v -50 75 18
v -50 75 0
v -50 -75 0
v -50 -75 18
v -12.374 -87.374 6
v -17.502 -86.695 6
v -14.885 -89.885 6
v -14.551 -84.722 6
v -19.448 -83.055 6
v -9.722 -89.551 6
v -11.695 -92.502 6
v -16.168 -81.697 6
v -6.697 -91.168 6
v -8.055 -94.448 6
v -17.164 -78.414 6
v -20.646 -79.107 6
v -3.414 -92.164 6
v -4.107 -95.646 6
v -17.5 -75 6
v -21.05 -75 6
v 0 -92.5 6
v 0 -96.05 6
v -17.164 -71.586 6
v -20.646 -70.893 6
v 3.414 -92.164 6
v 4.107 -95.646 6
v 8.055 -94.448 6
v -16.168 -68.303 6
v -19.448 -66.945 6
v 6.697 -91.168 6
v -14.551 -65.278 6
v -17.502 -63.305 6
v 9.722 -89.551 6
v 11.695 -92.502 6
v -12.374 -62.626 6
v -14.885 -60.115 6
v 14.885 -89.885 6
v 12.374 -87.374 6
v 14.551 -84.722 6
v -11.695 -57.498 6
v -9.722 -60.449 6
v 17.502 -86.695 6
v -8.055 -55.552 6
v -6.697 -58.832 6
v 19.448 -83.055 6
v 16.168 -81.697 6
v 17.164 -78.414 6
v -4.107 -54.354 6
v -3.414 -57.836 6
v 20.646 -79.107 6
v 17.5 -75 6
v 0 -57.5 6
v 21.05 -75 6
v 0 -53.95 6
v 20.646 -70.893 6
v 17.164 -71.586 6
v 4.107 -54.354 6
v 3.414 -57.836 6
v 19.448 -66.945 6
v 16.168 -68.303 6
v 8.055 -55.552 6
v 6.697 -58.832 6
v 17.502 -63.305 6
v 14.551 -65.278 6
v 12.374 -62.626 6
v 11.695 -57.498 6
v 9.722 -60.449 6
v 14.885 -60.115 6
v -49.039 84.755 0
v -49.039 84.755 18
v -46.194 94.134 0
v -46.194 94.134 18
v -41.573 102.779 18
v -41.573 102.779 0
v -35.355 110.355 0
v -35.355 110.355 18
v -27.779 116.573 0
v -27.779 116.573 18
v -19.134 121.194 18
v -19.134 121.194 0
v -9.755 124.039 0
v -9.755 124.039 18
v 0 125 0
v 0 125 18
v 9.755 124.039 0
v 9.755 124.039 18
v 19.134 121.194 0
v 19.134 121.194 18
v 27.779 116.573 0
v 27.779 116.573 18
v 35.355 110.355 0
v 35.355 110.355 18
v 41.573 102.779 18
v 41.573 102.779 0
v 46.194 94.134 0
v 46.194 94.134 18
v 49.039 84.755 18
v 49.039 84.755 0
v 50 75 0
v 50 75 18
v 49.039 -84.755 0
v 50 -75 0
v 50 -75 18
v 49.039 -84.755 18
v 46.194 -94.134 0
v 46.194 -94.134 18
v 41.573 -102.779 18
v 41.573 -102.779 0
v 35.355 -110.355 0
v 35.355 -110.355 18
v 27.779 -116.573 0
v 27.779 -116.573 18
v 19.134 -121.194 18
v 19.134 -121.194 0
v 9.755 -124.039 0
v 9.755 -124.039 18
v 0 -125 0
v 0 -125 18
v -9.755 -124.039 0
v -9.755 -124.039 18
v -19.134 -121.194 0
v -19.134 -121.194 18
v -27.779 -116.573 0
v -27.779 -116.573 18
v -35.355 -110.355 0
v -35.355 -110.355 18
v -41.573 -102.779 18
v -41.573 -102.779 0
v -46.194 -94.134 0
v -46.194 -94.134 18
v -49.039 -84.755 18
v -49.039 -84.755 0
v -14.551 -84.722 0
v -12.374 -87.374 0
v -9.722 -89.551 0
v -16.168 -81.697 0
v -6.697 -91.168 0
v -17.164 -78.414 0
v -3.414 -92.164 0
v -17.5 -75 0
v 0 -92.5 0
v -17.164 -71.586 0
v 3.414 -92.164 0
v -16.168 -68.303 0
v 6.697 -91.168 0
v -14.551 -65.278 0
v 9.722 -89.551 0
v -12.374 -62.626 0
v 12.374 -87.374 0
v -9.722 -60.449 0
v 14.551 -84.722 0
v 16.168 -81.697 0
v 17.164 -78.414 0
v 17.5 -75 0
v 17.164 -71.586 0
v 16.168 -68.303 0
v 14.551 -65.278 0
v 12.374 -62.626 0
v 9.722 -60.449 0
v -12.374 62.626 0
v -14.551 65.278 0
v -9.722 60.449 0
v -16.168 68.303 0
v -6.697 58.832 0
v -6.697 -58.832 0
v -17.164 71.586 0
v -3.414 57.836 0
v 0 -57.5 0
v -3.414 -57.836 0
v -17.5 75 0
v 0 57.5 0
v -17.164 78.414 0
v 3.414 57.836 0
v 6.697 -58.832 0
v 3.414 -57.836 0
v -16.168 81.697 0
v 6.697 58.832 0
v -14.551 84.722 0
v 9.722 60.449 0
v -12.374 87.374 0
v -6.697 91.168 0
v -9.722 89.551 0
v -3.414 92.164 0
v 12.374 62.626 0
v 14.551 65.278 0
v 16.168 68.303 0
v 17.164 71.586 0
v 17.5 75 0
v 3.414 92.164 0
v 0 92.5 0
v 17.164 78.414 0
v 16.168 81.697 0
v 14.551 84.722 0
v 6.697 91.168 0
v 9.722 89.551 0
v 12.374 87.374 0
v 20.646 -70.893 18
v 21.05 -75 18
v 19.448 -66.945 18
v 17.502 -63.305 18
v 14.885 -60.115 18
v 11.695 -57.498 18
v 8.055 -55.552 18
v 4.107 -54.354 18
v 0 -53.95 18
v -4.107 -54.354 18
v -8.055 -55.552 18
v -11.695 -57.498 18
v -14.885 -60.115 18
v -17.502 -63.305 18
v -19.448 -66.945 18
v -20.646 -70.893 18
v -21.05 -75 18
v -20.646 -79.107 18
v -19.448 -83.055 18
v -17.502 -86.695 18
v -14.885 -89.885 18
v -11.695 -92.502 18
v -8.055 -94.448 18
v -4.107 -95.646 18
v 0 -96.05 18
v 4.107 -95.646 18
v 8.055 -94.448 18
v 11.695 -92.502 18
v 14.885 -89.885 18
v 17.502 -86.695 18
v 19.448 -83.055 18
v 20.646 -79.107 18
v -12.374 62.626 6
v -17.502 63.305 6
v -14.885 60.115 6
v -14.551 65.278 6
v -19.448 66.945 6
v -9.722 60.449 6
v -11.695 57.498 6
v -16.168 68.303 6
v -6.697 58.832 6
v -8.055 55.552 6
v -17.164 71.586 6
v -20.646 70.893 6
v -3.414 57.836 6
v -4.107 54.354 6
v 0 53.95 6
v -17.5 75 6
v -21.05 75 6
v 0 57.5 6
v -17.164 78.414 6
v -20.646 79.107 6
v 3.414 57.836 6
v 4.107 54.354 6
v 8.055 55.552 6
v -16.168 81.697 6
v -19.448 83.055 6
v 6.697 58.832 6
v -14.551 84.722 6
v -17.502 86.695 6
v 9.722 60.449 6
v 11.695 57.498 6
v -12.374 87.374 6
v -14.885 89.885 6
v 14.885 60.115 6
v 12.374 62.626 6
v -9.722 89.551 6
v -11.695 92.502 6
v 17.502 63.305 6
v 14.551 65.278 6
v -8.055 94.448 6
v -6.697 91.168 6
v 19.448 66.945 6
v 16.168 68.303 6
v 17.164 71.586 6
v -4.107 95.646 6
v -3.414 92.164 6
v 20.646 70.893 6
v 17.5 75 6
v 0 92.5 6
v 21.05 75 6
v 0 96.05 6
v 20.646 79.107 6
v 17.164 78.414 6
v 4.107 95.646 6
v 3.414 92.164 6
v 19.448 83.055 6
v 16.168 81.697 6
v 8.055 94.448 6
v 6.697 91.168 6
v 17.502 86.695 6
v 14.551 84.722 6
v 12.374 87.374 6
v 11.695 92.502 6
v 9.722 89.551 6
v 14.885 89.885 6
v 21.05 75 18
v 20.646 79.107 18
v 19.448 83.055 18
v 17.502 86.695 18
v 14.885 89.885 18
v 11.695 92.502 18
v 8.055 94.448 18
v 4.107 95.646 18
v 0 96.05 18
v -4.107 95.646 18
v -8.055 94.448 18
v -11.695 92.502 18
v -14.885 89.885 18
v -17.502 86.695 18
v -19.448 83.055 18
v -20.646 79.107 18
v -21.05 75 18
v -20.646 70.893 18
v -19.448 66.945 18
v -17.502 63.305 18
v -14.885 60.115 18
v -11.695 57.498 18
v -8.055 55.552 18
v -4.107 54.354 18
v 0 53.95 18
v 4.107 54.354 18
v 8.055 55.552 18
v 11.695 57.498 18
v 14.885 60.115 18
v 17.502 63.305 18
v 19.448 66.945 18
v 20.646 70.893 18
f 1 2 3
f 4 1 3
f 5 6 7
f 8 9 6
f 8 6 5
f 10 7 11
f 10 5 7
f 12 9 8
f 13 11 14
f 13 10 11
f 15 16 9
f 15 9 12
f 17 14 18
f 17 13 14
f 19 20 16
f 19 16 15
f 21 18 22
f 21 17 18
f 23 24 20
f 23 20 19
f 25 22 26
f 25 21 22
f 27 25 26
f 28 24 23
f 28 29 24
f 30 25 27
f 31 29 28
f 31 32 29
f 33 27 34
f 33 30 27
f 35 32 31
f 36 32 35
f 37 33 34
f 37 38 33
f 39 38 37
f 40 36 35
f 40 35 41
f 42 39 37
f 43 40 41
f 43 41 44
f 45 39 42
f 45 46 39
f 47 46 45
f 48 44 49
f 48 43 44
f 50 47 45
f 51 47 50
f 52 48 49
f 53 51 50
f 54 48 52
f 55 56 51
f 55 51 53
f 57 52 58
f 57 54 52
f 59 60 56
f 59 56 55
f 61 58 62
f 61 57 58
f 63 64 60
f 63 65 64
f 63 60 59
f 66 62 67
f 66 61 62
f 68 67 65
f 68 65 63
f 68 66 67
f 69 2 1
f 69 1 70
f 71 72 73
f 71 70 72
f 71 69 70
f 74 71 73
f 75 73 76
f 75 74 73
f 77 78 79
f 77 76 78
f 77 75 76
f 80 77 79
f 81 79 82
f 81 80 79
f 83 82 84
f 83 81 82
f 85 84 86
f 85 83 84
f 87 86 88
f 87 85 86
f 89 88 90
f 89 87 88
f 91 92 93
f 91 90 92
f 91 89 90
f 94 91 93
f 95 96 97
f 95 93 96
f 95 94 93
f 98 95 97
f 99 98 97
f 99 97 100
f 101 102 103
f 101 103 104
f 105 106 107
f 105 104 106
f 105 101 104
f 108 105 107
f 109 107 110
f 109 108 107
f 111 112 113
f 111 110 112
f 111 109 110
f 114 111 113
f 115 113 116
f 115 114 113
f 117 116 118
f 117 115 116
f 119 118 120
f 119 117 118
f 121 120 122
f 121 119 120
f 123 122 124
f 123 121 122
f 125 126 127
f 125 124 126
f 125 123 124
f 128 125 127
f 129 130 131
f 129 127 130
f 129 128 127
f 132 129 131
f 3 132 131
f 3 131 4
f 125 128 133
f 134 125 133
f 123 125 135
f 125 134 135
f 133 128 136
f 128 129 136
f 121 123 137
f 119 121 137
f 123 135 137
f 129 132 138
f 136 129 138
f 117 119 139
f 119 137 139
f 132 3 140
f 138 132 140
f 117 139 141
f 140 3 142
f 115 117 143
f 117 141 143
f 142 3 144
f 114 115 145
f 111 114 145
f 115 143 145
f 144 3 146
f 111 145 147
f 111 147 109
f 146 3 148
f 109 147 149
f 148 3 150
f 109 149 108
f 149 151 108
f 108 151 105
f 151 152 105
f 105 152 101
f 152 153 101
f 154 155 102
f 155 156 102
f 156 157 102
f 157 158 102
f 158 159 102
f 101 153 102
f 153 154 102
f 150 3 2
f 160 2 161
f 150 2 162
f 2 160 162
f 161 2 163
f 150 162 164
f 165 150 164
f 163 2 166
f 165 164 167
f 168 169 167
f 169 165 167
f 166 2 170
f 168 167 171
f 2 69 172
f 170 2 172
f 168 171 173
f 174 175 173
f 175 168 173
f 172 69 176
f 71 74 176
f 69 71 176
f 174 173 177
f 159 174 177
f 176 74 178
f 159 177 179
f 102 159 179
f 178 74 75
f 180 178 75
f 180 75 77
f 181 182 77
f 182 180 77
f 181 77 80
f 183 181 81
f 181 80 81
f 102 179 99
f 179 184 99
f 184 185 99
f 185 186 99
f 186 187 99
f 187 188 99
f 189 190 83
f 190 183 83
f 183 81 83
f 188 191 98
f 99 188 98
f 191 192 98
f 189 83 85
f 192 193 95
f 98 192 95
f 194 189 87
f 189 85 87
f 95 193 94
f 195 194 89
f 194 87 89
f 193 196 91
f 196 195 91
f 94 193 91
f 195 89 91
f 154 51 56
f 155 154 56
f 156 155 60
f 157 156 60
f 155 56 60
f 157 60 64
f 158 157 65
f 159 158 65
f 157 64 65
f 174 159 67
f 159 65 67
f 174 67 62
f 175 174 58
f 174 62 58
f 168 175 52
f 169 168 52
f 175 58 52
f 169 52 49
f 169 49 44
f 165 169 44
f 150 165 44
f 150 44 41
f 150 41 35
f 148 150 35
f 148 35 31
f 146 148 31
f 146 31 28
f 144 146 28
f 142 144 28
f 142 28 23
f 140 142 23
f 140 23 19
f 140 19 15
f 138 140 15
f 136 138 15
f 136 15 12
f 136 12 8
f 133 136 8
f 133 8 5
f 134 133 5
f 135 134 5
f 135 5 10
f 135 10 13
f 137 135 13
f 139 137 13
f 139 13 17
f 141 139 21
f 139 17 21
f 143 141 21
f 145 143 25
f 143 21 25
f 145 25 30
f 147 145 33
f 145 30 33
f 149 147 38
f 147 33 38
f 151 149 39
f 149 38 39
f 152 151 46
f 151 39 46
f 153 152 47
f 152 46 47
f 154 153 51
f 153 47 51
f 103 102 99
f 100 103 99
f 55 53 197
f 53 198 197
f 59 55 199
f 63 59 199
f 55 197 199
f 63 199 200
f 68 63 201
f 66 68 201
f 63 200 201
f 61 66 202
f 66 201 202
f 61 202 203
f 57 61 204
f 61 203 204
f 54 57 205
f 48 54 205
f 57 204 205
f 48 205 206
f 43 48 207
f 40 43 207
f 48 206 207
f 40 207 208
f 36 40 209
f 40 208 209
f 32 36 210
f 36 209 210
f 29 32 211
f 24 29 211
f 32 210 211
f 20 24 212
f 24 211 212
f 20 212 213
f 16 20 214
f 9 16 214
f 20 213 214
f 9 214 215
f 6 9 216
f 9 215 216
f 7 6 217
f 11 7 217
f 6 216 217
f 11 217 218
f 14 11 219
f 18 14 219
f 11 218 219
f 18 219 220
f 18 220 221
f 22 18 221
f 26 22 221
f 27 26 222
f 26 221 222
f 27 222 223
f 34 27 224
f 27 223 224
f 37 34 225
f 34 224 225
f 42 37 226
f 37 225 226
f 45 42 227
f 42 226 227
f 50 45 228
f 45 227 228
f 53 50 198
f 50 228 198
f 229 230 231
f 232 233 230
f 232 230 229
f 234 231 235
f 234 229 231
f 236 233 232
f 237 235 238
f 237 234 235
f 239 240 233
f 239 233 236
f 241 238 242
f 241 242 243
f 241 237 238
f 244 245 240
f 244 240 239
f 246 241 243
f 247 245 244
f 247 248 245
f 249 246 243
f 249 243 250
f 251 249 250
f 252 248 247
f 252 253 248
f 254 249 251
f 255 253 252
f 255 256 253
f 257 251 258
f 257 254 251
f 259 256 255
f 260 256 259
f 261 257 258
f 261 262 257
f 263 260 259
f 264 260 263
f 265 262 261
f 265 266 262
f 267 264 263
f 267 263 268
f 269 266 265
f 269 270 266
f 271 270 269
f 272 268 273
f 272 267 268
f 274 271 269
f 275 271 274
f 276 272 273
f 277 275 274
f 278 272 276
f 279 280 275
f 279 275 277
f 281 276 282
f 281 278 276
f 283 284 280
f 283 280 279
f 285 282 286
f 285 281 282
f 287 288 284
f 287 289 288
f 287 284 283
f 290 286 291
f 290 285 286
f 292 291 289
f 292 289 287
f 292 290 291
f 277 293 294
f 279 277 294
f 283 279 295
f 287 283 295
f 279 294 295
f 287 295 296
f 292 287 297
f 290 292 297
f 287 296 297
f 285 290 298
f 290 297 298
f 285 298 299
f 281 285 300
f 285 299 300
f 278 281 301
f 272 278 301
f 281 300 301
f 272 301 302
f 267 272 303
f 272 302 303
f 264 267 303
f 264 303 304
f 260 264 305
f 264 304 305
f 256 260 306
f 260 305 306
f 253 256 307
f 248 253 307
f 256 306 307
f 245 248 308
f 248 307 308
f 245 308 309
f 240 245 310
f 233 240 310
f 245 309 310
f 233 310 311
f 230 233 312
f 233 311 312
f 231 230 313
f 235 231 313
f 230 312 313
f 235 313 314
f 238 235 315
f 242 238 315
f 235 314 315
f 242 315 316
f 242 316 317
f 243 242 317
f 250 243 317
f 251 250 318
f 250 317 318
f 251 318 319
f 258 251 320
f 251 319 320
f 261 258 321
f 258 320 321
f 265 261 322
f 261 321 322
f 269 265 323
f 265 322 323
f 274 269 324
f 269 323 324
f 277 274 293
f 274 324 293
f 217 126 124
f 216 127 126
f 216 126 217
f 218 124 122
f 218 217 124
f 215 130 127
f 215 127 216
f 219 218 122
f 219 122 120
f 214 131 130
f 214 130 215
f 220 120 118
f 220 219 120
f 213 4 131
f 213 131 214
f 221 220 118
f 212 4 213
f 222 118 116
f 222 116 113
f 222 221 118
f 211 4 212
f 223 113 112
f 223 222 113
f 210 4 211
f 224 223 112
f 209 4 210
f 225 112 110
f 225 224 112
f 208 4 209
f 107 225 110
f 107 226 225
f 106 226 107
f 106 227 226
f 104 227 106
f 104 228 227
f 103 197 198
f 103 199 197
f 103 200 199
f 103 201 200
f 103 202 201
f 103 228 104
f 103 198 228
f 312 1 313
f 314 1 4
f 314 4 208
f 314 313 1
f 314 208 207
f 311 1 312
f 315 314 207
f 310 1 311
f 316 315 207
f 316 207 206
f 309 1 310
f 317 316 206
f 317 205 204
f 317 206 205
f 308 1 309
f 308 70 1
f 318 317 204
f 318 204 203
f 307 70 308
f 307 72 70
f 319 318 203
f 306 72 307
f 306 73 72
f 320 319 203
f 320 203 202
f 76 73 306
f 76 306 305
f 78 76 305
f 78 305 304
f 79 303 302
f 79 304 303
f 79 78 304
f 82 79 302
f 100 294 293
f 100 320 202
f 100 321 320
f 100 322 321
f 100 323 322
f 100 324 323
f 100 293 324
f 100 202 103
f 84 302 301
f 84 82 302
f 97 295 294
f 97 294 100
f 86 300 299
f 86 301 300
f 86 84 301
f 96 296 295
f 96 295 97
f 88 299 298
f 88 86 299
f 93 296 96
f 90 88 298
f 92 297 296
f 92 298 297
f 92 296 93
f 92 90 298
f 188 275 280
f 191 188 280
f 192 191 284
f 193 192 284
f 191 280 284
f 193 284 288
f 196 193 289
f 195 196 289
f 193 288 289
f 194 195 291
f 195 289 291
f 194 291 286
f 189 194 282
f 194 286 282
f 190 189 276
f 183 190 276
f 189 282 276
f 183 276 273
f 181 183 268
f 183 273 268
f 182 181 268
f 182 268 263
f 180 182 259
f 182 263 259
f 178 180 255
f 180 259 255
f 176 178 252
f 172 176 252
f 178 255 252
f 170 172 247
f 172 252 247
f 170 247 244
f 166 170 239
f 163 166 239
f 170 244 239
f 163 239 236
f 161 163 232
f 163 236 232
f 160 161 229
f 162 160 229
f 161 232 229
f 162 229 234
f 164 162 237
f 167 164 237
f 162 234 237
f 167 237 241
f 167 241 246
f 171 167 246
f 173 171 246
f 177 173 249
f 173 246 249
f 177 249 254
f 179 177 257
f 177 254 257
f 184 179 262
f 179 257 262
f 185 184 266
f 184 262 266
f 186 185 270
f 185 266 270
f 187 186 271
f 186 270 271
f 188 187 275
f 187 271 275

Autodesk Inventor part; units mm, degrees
ref_plane "YZ Plane" through (0, 0, 0) normal (1, 0, 0) x (0, 1, 0)
ref_plane "XZ Plane" through (0, 0, 0) normal (0, 1, 0) x (-1, 0, 0)
ref_plane "XY Plane" through (0, 0, 0) normal (0, 0, 1) x (1, 0, 0)
sketch "Szkic1" plane through (0, 0, 0) normal (0, 0, 1) x (1, 0, 0)
  line L0 (0, -75) -> (0, 75) construction
  line L1 (50, -75) -> (50, 75)
  line L2 (-50, 75) -> (-50, -75)
  arc A0 (-50, -75) -> (50, -75) centre (0, -75) ccw
  arc A1 (50, 75) -> (-50, 75) centre (0, 75) ccw
  point P0 (0, 0)
  dimension "d2" = 100
extrude "Wyciągnięcie proste2" add sketch "Szkic1" along normal blind 18
sketch "Szkic2" plane through (0, 0, 18) normal (0, 0, 1) x (1, 0, 0)
  circle A0 centre (0, 75) radius 21.05
  circle A1 centre (0, -75) radius 21.05
  point P0 (0, 0)
  dimension "d7" = 42.1
  dimension "d8" = 42.1
extrude "Wyciągnięcie proste3" cut sketch "Szkic2" against normal blind 12
sketch "Szkic3" plane through (0, -75, 6) normal (0, 0, 1) x (1, 0, 0)
  circle A0 centre (0, 0) radius 17.5
  point P0 (0, 75)
  dimension "d11" = 35
sketch "Szkic4" plane through (0, 75, 6) normal (0, 0, 1) x (1, 0, 0)
  circle A0 centre (0, 0) radius 17.5
  point P0 (0, -75)
  dimension "d12" = 35
extrude "Wyciągnięcie proste4" cut sketch "Szkic4" against normal blind 12
extrude "Wyciągnięcie proste5" cut sketch "Szkic3" against normal blind 12
equation "\"d12\" = d11"
properties part number "podstawa" material "MDF - płyta pilśniowa o średniej gęstości"
